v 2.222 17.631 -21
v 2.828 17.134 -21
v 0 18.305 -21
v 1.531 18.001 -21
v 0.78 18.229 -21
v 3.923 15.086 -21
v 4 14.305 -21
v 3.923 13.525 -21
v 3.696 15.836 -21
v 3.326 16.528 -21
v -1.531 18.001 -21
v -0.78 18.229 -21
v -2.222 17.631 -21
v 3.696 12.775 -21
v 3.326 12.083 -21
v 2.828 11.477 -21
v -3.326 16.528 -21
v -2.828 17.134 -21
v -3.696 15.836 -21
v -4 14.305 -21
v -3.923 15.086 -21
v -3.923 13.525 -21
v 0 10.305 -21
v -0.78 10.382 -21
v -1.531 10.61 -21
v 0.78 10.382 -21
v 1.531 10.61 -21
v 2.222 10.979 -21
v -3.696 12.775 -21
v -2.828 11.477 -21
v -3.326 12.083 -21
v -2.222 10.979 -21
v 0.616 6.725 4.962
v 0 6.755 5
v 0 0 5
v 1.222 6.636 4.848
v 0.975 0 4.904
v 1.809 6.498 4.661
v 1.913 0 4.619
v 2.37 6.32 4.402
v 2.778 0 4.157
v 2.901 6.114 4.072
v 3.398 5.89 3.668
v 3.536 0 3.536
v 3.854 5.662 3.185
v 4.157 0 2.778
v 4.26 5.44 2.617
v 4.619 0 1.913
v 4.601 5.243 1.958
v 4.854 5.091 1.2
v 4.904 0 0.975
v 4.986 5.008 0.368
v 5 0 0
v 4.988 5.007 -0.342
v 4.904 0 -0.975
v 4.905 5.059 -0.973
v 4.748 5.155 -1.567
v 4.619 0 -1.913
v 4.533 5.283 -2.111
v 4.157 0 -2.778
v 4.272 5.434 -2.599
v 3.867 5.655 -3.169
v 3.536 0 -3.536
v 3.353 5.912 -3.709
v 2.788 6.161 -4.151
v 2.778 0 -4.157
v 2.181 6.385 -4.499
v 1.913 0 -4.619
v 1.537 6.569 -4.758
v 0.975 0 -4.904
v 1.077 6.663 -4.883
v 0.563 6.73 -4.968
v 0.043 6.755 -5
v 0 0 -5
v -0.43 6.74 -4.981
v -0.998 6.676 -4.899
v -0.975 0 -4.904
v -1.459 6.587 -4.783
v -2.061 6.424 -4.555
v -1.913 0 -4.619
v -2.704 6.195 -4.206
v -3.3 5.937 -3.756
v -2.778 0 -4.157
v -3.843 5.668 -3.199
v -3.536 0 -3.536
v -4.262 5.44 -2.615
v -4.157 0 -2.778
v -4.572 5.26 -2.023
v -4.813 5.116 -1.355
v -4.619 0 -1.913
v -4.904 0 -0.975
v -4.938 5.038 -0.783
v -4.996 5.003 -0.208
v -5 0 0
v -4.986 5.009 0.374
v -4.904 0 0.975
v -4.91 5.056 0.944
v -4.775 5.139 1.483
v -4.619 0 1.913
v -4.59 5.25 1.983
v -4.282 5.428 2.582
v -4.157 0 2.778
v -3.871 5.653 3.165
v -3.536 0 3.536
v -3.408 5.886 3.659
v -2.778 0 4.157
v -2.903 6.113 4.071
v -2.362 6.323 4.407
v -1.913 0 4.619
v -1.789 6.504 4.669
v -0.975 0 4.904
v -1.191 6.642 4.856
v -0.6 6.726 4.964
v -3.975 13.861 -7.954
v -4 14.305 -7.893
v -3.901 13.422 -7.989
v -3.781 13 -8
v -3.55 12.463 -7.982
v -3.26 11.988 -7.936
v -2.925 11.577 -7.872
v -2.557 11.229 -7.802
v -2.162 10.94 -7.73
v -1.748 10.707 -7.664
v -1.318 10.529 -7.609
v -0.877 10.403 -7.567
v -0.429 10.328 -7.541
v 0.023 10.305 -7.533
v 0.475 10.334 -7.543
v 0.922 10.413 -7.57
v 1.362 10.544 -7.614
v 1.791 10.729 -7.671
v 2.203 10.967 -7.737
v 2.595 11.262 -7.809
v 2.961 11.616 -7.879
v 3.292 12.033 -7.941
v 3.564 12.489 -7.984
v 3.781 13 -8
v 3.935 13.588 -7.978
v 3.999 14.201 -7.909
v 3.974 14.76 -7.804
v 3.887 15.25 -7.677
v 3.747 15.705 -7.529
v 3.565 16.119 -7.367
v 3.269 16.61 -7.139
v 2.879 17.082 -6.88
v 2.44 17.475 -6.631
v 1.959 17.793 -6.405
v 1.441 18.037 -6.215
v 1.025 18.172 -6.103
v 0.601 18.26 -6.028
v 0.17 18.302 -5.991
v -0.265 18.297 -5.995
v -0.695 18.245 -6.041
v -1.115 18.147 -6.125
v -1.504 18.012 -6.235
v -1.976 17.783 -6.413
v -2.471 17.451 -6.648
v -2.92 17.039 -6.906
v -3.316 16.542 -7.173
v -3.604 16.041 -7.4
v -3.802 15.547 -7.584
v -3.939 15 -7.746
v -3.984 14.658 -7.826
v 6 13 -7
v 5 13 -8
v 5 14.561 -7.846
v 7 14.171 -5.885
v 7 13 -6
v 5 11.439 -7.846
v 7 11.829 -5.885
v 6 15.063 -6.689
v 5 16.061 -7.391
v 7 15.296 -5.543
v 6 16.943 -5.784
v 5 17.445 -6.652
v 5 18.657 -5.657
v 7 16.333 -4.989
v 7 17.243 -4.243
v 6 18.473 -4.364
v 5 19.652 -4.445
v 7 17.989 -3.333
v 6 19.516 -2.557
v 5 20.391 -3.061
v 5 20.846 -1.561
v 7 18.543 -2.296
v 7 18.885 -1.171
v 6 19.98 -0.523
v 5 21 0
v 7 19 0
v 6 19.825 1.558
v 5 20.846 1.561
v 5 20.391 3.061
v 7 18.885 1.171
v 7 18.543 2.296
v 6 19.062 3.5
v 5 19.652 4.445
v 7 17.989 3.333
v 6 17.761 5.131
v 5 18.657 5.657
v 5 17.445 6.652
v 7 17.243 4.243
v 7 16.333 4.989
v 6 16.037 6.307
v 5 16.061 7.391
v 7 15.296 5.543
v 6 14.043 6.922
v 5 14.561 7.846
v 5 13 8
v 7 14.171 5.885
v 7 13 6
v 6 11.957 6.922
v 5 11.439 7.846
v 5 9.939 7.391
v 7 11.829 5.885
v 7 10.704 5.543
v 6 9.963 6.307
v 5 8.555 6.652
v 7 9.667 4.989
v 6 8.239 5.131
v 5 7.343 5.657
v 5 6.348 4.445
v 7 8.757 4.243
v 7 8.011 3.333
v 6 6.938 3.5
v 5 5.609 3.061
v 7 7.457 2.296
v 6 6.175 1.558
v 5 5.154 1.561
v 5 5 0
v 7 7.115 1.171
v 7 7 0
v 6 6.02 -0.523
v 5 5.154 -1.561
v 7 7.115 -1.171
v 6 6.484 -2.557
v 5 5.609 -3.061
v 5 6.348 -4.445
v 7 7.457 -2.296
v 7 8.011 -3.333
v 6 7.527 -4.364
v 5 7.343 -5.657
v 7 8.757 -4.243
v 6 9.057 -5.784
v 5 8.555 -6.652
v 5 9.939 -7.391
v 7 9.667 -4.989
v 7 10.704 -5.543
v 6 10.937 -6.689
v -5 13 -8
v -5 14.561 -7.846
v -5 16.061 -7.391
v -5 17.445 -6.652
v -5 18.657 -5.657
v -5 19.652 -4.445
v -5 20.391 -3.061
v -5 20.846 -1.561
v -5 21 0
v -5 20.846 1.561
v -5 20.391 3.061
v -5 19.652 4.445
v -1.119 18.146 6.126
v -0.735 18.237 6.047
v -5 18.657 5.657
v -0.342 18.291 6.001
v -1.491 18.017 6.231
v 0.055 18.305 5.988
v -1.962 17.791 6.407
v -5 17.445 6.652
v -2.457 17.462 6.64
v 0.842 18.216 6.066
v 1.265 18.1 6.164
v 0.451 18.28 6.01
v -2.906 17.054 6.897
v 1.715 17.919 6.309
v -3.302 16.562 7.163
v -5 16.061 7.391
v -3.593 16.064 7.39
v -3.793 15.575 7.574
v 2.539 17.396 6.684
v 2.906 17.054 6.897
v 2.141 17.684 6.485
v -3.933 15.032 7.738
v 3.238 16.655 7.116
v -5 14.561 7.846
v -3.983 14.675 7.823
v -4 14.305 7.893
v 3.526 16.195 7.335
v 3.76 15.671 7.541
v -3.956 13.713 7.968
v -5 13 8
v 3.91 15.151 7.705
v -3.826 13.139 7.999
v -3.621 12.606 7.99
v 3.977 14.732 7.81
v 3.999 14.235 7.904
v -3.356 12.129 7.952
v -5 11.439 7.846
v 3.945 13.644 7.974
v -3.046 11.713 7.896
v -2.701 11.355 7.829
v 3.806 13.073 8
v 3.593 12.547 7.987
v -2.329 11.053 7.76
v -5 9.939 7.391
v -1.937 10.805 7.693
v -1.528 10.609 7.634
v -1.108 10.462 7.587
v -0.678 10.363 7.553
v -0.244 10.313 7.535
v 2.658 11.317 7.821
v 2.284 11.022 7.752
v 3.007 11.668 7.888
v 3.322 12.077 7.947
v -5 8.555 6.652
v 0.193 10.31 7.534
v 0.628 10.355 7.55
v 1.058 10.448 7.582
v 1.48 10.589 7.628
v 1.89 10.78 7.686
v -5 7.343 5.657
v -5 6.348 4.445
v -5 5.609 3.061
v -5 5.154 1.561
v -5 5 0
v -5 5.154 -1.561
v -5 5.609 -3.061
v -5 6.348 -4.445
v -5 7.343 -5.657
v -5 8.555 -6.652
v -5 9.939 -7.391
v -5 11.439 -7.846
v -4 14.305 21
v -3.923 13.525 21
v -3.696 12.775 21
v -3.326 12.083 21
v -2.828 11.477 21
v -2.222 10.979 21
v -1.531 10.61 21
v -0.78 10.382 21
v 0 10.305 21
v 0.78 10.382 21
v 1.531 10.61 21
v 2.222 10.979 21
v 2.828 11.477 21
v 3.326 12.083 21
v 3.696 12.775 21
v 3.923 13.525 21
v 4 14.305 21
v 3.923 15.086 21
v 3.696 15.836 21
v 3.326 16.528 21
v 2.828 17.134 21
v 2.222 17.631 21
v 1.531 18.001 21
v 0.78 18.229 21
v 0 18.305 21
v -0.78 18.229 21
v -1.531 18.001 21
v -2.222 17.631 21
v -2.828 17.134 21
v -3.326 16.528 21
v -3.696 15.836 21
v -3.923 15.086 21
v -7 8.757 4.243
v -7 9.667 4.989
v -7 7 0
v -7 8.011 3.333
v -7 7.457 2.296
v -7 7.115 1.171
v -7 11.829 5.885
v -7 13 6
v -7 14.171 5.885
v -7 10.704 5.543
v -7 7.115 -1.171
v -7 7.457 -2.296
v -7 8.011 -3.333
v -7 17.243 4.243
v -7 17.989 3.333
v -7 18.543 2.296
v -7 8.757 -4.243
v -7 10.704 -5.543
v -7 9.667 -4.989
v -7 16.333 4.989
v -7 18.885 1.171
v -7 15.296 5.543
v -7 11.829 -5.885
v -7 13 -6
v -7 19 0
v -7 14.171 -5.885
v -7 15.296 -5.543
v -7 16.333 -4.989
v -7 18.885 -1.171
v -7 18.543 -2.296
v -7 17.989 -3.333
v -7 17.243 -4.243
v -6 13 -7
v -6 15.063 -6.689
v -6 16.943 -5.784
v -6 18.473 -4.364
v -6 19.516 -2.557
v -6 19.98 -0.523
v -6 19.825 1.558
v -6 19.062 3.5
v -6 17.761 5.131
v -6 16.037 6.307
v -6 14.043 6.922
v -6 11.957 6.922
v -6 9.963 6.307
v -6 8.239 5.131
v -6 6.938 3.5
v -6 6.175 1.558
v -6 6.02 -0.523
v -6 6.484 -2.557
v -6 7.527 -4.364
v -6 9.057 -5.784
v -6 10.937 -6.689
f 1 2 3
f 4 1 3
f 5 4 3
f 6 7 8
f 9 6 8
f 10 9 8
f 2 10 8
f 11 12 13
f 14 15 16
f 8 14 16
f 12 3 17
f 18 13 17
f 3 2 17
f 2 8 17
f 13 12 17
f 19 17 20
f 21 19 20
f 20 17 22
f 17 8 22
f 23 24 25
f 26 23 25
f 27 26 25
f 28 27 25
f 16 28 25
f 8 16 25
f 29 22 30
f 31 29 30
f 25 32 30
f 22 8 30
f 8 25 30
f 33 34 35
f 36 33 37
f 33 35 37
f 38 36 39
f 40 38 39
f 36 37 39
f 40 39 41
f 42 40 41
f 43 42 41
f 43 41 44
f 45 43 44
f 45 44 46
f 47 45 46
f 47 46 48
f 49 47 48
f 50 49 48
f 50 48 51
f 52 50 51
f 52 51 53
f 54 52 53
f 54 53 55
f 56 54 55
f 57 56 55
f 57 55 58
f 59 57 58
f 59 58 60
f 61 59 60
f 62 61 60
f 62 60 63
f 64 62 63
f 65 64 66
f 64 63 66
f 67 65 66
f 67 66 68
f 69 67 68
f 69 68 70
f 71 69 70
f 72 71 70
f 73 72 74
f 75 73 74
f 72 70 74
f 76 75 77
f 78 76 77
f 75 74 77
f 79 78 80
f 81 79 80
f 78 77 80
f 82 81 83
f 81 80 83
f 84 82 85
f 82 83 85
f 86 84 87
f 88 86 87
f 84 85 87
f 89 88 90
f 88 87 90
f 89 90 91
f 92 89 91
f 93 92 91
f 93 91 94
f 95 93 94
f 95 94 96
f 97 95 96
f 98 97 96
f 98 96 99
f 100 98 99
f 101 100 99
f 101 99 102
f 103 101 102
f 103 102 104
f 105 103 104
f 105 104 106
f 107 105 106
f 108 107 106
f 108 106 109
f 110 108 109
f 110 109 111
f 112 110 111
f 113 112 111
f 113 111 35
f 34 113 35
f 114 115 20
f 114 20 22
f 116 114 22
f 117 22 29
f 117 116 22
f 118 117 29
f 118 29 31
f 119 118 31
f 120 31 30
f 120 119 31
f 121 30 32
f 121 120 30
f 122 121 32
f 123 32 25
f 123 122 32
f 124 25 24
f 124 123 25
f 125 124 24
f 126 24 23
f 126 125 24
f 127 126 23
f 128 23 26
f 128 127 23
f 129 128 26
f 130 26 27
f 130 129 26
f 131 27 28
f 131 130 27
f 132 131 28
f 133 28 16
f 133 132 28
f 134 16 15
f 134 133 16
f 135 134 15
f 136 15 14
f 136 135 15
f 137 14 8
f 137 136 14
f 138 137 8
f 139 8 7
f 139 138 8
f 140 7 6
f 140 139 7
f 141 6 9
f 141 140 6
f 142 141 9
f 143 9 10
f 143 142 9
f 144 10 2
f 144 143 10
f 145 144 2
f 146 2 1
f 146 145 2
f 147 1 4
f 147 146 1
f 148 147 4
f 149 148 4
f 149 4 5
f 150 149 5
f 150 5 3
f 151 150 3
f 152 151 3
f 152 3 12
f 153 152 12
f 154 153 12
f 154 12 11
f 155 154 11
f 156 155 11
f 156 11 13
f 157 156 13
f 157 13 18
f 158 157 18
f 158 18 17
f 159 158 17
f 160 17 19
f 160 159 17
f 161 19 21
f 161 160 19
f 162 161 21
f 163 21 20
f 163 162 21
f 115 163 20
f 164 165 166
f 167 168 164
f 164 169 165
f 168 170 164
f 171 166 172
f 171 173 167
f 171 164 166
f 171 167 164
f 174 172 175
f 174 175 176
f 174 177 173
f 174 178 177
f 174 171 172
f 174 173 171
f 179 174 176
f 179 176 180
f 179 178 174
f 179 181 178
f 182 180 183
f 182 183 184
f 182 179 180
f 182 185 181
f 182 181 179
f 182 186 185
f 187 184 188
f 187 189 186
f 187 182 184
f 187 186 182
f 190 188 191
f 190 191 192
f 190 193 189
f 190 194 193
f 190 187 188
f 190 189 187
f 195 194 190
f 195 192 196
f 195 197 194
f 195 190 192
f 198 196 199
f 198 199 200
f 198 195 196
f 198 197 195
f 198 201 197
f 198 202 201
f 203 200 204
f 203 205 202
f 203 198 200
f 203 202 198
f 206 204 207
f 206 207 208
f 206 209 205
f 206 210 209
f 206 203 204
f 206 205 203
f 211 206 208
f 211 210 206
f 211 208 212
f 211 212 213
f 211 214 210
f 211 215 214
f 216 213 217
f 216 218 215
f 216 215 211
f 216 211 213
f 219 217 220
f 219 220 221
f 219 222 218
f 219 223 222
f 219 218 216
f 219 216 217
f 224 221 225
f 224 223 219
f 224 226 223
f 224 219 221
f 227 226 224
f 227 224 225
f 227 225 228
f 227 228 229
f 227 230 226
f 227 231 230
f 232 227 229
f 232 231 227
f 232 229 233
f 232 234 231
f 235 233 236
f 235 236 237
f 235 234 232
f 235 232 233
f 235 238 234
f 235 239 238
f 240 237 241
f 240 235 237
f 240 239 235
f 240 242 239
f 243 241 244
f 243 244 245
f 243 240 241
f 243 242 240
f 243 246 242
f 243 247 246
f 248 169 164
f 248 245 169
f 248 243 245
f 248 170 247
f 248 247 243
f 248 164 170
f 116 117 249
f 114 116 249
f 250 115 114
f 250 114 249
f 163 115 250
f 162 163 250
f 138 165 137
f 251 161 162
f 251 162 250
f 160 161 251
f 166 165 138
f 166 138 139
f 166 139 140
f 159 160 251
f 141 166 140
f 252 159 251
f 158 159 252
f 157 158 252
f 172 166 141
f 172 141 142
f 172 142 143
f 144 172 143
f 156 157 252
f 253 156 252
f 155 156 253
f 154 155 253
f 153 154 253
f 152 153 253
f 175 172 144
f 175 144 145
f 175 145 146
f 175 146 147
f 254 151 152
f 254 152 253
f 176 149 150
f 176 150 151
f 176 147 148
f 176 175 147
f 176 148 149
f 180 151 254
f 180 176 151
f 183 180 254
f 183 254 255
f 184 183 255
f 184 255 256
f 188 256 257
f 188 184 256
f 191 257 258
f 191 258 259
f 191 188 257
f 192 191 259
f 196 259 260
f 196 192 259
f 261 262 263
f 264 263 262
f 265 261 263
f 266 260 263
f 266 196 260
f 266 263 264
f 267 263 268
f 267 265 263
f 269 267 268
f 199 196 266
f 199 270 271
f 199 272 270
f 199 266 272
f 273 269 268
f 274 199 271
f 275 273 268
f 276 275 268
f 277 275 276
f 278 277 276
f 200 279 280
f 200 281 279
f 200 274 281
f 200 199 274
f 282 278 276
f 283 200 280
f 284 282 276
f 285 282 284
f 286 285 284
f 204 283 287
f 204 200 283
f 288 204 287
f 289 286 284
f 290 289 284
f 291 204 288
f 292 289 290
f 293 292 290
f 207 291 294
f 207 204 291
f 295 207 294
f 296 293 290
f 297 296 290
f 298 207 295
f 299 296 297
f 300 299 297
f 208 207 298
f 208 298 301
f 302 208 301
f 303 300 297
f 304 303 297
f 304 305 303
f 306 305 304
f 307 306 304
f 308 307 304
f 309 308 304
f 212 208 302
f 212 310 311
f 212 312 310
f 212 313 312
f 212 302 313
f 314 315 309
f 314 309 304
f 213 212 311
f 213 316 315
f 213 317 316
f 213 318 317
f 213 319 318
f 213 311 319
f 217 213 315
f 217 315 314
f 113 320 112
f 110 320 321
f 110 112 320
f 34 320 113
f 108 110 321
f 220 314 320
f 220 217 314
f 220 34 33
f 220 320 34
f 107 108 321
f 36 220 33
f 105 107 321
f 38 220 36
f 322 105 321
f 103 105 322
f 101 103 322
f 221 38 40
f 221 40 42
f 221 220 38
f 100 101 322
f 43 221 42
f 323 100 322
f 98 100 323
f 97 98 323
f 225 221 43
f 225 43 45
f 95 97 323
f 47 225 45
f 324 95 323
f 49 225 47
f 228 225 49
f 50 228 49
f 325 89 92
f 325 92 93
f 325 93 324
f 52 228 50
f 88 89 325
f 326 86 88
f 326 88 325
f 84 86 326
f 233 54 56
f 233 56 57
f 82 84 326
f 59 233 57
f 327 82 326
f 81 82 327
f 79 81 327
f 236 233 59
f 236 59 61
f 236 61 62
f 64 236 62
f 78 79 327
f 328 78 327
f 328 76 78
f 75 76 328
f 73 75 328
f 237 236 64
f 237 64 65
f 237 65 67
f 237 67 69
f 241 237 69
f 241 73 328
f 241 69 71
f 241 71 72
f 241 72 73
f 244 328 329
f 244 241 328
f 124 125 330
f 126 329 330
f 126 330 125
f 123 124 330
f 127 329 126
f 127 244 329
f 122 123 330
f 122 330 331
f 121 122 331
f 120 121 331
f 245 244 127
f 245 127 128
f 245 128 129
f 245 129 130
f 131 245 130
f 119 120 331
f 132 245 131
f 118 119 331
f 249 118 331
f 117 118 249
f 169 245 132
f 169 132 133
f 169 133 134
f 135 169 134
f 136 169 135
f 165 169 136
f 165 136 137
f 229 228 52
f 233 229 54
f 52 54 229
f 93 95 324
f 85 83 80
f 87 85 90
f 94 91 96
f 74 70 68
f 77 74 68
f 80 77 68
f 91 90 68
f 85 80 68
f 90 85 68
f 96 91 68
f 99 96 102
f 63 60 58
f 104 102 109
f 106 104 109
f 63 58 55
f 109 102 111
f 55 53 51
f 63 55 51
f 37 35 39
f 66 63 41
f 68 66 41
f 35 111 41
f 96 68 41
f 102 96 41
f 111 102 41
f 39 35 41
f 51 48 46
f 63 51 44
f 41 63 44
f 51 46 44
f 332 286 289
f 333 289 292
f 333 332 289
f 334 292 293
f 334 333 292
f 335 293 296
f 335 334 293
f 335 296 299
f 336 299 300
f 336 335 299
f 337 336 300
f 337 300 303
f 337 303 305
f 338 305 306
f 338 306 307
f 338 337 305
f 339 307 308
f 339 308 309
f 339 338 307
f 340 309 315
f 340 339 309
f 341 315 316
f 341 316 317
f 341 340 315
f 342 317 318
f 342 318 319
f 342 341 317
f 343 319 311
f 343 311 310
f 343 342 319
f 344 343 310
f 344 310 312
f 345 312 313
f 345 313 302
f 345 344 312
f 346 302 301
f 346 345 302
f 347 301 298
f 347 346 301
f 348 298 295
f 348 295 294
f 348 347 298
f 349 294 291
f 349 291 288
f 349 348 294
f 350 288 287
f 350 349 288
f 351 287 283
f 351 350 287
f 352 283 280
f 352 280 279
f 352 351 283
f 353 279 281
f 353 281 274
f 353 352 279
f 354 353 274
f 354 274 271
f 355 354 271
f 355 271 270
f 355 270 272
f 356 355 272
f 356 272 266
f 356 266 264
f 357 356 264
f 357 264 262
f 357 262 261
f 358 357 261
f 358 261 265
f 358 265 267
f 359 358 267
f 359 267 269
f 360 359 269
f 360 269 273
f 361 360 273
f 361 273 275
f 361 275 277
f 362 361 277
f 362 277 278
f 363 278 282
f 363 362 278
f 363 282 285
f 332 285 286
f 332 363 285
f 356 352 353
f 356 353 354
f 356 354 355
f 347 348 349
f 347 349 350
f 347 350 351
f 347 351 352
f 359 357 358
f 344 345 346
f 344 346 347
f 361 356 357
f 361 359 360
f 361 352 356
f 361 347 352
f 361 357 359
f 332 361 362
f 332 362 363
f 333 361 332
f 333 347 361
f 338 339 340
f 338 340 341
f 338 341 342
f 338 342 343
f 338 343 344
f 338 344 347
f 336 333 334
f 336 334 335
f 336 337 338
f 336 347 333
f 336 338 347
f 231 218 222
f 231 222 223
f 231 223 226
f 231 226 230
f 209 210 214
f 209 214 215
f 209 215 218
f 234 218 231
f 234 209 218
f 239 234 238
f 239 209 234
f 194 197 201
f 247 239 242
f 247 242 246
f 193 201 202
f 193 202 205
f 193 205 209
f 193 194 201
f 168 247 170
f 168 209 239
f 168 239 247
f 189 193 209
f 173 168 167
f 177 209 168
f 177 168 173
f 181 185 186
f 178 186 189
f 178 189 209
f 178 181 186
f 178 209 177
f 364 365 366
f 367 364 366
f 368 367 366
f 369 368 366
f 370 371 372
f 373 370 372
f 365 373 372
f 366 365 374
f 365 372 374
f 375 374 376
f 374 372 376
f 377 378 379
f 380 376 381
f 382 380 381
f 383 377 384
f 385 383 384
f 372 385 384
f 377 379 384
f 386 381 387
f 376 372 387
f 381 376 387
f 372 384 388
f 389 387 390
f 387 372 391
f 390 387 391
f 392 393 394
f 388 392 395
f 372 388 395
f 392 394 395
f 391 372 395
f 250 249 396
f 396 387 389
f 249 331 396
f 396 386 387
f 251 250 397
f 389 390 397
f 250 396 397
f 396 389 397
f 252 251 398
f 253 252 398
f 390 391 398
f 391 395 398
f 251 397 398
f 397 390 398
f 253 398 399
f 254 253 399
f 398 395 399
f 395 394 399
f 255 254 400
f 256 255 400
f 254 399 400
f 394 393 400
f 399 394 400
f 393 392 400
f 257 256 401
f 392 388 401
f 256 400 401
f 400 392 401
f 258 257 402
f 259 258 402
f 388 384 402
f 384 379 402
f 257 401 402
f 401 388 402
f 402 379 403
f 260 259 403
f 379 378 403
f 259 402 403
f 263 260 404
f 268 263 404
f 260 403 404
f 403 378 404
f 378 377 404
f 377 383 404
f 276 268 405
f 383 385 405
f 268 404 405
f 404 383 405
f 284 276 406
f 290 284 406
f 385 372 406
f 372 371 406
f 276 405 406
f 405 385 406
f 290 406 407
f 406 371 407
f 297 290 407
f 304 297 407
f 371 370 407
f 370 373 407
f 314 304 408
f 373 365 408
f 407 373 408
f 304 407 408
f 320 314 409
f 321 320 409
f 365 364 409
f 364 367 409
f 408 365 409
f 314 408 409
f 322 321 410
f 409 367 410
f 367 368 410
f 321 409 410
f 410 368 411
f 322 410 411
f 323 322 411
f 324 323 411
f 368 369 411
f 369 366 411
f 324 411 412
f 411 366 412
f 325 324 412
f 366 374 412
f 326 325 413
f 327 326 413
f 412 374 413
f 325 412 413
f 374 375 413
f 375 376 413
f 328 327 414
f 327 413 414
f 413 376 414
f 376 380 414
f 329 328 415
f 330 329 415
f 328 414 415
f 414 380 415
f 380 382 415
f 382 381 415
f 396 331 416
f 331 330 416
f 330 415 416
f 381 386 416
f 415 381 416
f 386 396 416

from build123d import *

# Parameters (mm, degrees)
SKETCH1_R           = 5
BOSS_EXTRUDE1_DEPTH = 10
SKETCH2_R           = 8
BOSS_EXTRUDE2_DEPTH = 7
SKETCH3_R           = 4
BOSS_EXTRUDE3_DEPTH = 21
CHAMFER1_SIZE       = 2


with BuildPart() as part:
    # Sketch1 → Boss-Extrude1 (new body)
    with BuildSketch(Plane(origin=(0, 0, 0), x_dir=(1, 0, 0), z_dir=(0, 1, 0))):
        with Locations(Location((0, 0, 0), (0, 0, 270))):
            Circle(SKETCH1_R)
    extrude(amount=BOSS_EXTRUDE1_DEPTH)

    # Sketch2 → Boss-Extrude2 (add, symmetric)
    with BuildSketch(Plane(origin=(0, 0, 0), x_dir=(0, 0, -1), z_dir=(1, 0, 0))):
        with Locations((0, 13)):
            Circle(SKETCH2_R)
    extrude(amount=BOSS_EXTRUDE2_DEPTH, both=True)

    # Sketch3 → Boss-Extrude3 (add, symmetric)
    with BuildSketch(Plane.XY):
        with Locations(Location((0, 14.305369128, 0), (0, 0, 180))):
            Circle(SKETCH3_R)
    extrude(amount=BOSS_EXTRUDE3_DEPTH, both=True)

    # Chamfer1
    chamfer1_edges = [part.edges().sort_by_distance(p)[0] for p in [
        (-7, 13, 8),
        (7, 13, 8),
    ]]
    chamfer(chamfer1_edges, length=CHAMFER1_SIZE - 0.0001)  # a hair under: the kernel refuses the full size


solid = part.part
